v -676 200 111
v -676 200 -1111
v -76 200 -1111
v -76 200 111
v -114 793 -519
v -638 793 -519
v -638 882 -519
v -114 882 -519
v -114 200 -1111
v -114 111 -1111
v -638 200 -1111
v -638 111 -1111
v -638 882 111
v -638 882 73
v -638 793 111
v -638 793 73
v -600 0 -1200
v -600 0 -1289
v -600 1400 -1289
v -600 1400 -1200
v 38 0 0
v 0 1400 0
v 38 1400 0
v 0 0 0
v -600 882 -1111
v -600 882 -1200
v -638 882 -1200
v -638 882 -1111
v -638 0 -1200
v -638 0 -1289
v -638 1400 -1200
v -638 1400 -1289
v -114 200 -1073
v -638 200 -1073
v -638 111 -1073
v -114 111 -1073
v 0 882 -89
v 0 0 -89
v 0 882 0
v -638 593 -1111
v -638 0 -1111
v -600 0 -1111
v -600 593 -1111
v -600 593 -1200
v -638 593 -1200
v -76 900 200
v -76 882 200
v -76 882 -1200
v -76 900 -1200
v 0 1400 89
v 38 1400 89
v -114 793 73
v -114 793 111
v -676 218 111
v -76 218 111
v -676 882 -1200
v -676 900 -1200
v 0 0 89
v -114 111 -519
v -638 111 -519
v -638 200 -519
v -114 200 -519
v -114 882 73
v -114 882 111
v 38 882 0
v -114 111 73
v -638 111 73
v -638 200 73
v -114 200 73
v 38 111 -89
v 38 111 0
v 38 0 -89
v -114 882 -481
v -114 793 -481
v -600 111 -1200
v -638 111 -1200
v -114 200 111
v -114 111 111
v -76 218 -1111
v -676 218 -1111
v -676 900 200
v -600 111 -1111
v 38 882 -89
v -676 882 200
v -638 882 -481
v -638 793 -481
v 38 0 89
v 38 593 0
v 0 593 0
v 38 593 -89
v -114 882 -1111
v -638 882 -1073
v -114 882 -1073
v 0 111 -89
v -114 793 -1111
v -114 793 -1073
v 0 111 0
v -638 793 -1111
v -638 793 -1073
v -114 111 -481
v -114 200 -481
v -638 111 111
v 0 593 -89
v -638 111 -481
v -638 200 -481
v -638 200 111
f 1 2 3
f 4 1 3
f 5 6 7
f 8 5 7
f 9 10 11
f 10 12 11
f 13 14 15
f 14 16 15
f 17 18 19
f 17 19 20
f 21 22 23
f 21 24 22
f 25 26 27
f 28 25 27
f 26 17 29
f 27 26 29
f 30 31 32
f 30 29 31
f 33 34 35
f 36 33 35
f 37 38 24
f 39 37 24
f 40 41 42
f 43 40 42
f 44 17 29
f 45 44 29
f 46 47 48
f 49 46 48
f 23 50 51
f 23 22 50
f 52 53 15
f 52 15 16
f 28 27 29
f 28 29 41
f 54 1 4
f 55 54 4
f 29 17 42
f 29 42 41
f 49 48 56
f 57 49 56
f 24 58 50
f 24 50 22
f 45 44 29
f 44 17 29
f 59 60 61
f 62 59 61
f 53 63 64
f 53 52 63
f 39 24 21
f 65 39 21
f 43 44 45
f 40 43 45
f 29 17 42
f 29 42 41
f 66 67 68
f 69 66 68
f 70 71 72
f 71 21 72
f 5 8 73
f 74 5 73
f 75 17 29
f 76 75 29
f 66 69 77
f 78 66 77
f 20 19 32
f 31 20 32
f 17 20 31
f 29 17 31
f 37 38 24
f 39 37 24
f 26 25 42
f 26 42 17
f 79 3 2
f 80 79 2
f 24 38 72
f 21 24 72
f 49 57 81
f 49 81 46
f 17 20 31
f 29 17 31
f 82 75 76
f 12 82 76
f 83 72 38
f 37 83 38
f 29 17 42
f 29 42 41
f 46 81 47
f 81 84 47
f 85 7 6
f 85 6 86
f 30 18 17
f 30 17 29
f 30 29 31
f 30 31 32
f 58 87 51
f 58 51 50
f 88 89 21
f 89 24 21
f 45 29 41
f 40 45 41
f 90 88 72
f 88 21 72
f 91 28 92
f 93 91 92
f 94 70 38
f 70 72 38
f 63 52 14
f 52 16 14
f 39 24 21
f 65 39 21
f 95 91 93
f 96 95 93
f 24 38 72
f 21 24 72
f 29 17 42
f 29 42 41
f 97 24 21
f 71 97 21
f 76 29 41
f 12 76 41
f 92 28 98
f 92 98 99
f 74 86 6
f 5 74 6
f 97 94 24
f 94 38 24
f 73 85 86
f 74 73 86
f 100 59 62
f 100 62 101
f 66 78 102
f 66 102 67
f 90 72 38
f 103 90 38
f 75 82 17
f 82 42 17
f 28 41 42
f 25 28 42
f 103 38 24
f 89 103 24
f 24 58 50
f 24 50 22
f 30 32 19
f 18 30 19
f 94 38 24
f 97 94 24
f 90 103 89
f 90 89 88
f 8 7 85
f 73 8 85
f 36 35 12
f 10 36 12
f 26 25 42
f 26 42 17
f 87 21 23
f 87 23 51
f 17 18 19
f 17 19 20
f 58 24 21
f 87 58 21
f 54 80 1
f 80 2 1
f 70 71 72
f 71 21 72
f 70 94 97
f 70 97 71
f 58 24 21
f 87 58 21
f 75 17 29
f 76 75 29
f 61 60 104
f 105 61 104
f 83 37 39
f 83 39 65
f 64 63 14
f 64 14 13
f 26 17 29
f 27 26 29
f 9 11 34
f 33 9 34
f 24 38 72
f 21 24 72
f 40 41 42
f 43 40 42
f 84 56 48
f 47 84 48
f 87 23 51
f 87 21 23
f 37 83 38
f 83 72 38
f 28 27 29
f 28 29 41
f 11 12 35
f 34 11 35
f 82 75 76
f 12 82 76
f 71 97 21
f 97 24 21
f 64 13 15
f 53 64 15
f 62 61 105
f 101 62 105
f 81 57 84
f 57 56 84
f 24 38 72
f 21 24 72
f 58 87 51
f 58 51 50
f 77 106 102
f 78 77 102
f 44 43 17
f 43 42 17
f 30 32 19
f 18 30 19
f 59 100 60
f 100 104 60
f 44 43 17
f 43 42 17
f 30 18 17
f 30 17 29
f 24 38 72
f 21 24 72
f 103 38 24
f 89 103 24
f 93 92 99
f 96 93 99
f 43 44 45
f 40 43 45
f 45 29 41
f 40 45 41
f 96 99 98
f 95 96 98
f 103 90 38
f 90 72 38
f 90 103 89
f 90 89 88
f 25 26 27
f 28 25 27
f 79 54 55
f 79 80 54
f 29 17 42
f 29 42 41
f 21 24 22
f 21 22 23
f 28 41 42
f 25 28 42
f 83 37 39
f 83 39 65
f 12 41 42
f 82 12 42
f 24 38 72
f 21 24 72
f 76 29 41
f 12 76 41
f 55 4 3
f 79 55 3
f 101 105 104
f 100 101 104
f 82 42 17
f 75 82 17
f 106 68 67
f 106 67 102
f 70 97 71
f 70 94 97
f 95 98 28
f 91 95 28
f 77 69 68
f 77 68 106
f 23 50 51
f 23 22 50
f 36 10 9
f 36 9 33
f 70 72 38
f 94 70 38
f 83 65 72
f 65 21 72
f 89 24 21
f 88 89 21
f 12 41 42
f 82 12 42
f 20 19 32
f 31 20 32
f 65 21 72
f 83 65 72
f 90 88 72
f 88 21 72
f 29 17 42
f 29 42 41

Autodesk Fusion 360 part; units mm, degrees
sketch "Sketch1" plane through (0, 0, 0) normal (0, 1, 0) x (1, 0, 0) in component "Main"
  line L0 (0, 0) -> (38, 0)
  line L1 (38, 0) -> (38, 89)
  line L2 (38, 89) -> (0, 89)
  line L3 (0, 89) -> (0, 0)
  dimension "d6" = 38
  dimension "d7" = 89
extrude "Extrude1" add sketch "Sketch1" along normal blind 882 makes body 1 in component "Main"
sketch "Sketch1 (2)" plane through (0, 0, 0) normal (0, 1, 0) x (1, 0, 0) in component "bottom section"
  line L0 (0, 0) -> (38, 0)
  line L1 (38, 0) -> (38, 89)
  line L2 (38, 89) -> (0, 89)
  line L3 (0, 89) -> (0, 0)
  dimension "d11" = 89
  dimension "d12" = 38
extrude "Extrude1'" add sketch "Sketch1 (2)" along normal blind 111 separate body makes body 2 in component "bottom section"
sketch "Sketch1 (3)" plane through (0, 0, 0) normal (0, 1, 0) x (1, 0, 0) in component "middle section"
  line L0 (0, 0) -> (38, 0)
  line L1 (38, 0) -> (38, 89)
  line L2 (38, 89) -> (0, 89)
  line L3 (0, 89) -> (0, 0)
  dimension "d16" = 89
  dimension "d17" = 38
extrude "Extrude1''" add sketch "Sketch1 (3)" along normal blind 593 separate body makes body 3 in component "middle section"
sketch "Sketch1 (4)" plane through (0, 0, 0) normal (0, 1, 0) x (1, 0, 0) in component "Apron"
  line L0 (0, 0) -> (38, 0)
  line L1 (38, 0) -> (38, -89)
  line L2 (38, -89) -> (0, -89)
  line L3 (0, -89) -> (0, 0)
  dimension "d28" = 89
  dimension "d29" = 38
extrude "Extrude1'''" add sketch "Sketch1 (4)" along normal blind 1400 separate body makes body 4 in component "Apron"
sketch "Sketch1 (5)" plane through (0, 0, 0) normal (0, 1, 0) x (1, 0, 0) in component "Support"
  line L0 (0, 0) -> (-38, 0)
  line L1 (-38, 0) -> (-38, -89)
  line L2 (-38, -89) -> (0, -89)
  line L3 (0, -89) -> (0, 0)
  dimension "d44" = 89
  dimension "d45" = 38
extrude "Extrude1''''" add sketch "Sketch1 (5)" along normal blind 524 separate body makes body 5 in component "Support"
pattern_linear "00000000-0000-0000-0000-000000000000" [suppressed]
pattern_linear "00000000-0000-0000-0000-000000000000'" [suppressed]
sketch "Sketch1 (6)" plane through (0, 0, 0) normal (0, 1, 0) x (1, 0, 0) in component "Table top"
  line L0 (0, 0) -> (600, 0)
  line L1 (600, 0) -> (600, 1400)
  line L2 (600, 1400) -> (0, 1400)
  line L3 (0, 1400) -> (0, 0)
  dimension "d69" = 1400
  dimension "d70" = 600
extrude "Extrude1'''''" add sketch "Sketch1 (6)" along normal blind 18 separate body makes body 6 in component "Table top"
sketch "Sketch1 (7)" plane through (0, 0, 0) normal (0, 1, 0) x (1, 0, 0) in component "Shelf"
  line L0 (0, 0) -> (600, 0)
  line L1 (600, 0) -> (600, 1222)
  line L2 (600, 1222) -> (0, 1222)
  line L3 (0, 1222) -> (0, 0)
  dimension "d77" = 600
  dimension "d78" = 1222
extrude "Extrude1''''''" add sketch "Sketch1 (7)" along normal blind 18 separate body makes body 7 in component "Shelf"
component "Leg set" placed x (1, 0, 0) y (0, 1, 0) z (0, 0, 1) at (0, 0, 0)
component "Leg set" placed x (-1, 0, 0) y (0, 1, 0) z (0, 0, -1) at (-600, 0, -1200)
component "Supports" placed x (1, 0, 0) y (0, 1, 0) z (0, 0, 1) at (0, 0, 0)
component "Table top" placed x (1, 0, 0) y (0, 1, 0) z (0, 0, 1) at (-676, 882, 200)
component "Shelf" placed x (1, 0, 0) y (0, 1, 0) z (0, 0, 1) at (-676, 200, 111)
component "Main" placed x (1, 0, 0) y (0, 1, 0) z (0, 0, 1) at (0, 0, 0) in component "leg"
component "bottom section" placed x (1, 0, 0) y (0, 1, 0) z (0, 0, 1) at (0, 0, 0) in component "leg"
component "middle section" placed x (1, 0, 0) y (0, 1, 0) z (0, 0, 1) at (0, 0, 0) in component "leg"
component "leg" placed x (1, 0, 0) y (0, 1, 0) z (0, 0, 1) at (0, 0, 0) in component "Leg set"
component "Apron" placed x (1, 0, 0) y (0, 1, 0) z (0, 0, 1) at (0, 0, 0) in component "Leg set"
component "leg" placed x (1, 0, 0) y (0, 1, 0) z (0, 0, 1) at (0, 0, 0) in component "Leg set"
component "Apron" placed x (1, 0, 0) y (0, 1, 0) z (0, 0, 1) at (0, 0, 0) in component "Leg set"
component "Support" placed x (0, 0, 1) y (1, 0, 0) z (0, 1, 0) at (-638, 793, 111) in component "Supports"
component "Support" placed x (0, 0, 1) y (1, 0, 0) z (0, 1, 0) at (-638, 111, -1073) in component "Supports"
component "Support" placed x (0, 0, 1) y (1, 0, 0) z (0, 1, 0) at (-638, 111, -481) in component "Supports"
component "Support" placed x (0, 0, 1) y (1, 0, 0) z (0, 1, 0) at (-638, 793, -1073) in component "Supports"
component "Support" placed x (0, 0, 1) y (1, 0, 0) z (0, 1, 0) at (-638, 793, -481) in component "Supports"
component "Support" placed x (0, 0, 1) y (1, 0, 0) z (0, 1, 0) at (-638, 111, 111) in component "Supports"
equation "table_width = 1400 mm"
equation "table_depth = 600 mm"
equation "table_height = 900 mm"
equation "wood_width = 89 mm"
equation "wood_depth = 38 mm"
equation "d6 = wood_depth"
equation "d7 = wood_width"
equation "top_thickness = 18 mm"
equation "d9 = table_height - top_thickness"
equation "d11 = wood_width"
equation "d12 = wood_depth"
equation "shelf_height = 200 mm"
equation "d14 = shelf_height - wood_width"
equation "d16 = wood_width"
equation "d17 = wood_depth"
equation "d18 = table_height - wood_width - shelf_height - top_thickness"
equation "d28 = wood_width"
equation "d29 = wood_depth"
equation "d30 = table_width"
equation "d44 = wood_width"
equation "d45 = wood_depth"
equation "d46 = table_depth - 2 * wood_depth"
equation "d58 = table_width - 2 * wood_width - wood_depth"
equation "d67 = table_width - 2 * wood_width - wood_depth"
equation "d69 = table_width"
equation "d70 = table_depth"
equation "d71 = top_thickness"
equation "d77 = table_depth"
equation "d78 = table_width - 2 * wood_width"
equation "d79 = top_thickness"
